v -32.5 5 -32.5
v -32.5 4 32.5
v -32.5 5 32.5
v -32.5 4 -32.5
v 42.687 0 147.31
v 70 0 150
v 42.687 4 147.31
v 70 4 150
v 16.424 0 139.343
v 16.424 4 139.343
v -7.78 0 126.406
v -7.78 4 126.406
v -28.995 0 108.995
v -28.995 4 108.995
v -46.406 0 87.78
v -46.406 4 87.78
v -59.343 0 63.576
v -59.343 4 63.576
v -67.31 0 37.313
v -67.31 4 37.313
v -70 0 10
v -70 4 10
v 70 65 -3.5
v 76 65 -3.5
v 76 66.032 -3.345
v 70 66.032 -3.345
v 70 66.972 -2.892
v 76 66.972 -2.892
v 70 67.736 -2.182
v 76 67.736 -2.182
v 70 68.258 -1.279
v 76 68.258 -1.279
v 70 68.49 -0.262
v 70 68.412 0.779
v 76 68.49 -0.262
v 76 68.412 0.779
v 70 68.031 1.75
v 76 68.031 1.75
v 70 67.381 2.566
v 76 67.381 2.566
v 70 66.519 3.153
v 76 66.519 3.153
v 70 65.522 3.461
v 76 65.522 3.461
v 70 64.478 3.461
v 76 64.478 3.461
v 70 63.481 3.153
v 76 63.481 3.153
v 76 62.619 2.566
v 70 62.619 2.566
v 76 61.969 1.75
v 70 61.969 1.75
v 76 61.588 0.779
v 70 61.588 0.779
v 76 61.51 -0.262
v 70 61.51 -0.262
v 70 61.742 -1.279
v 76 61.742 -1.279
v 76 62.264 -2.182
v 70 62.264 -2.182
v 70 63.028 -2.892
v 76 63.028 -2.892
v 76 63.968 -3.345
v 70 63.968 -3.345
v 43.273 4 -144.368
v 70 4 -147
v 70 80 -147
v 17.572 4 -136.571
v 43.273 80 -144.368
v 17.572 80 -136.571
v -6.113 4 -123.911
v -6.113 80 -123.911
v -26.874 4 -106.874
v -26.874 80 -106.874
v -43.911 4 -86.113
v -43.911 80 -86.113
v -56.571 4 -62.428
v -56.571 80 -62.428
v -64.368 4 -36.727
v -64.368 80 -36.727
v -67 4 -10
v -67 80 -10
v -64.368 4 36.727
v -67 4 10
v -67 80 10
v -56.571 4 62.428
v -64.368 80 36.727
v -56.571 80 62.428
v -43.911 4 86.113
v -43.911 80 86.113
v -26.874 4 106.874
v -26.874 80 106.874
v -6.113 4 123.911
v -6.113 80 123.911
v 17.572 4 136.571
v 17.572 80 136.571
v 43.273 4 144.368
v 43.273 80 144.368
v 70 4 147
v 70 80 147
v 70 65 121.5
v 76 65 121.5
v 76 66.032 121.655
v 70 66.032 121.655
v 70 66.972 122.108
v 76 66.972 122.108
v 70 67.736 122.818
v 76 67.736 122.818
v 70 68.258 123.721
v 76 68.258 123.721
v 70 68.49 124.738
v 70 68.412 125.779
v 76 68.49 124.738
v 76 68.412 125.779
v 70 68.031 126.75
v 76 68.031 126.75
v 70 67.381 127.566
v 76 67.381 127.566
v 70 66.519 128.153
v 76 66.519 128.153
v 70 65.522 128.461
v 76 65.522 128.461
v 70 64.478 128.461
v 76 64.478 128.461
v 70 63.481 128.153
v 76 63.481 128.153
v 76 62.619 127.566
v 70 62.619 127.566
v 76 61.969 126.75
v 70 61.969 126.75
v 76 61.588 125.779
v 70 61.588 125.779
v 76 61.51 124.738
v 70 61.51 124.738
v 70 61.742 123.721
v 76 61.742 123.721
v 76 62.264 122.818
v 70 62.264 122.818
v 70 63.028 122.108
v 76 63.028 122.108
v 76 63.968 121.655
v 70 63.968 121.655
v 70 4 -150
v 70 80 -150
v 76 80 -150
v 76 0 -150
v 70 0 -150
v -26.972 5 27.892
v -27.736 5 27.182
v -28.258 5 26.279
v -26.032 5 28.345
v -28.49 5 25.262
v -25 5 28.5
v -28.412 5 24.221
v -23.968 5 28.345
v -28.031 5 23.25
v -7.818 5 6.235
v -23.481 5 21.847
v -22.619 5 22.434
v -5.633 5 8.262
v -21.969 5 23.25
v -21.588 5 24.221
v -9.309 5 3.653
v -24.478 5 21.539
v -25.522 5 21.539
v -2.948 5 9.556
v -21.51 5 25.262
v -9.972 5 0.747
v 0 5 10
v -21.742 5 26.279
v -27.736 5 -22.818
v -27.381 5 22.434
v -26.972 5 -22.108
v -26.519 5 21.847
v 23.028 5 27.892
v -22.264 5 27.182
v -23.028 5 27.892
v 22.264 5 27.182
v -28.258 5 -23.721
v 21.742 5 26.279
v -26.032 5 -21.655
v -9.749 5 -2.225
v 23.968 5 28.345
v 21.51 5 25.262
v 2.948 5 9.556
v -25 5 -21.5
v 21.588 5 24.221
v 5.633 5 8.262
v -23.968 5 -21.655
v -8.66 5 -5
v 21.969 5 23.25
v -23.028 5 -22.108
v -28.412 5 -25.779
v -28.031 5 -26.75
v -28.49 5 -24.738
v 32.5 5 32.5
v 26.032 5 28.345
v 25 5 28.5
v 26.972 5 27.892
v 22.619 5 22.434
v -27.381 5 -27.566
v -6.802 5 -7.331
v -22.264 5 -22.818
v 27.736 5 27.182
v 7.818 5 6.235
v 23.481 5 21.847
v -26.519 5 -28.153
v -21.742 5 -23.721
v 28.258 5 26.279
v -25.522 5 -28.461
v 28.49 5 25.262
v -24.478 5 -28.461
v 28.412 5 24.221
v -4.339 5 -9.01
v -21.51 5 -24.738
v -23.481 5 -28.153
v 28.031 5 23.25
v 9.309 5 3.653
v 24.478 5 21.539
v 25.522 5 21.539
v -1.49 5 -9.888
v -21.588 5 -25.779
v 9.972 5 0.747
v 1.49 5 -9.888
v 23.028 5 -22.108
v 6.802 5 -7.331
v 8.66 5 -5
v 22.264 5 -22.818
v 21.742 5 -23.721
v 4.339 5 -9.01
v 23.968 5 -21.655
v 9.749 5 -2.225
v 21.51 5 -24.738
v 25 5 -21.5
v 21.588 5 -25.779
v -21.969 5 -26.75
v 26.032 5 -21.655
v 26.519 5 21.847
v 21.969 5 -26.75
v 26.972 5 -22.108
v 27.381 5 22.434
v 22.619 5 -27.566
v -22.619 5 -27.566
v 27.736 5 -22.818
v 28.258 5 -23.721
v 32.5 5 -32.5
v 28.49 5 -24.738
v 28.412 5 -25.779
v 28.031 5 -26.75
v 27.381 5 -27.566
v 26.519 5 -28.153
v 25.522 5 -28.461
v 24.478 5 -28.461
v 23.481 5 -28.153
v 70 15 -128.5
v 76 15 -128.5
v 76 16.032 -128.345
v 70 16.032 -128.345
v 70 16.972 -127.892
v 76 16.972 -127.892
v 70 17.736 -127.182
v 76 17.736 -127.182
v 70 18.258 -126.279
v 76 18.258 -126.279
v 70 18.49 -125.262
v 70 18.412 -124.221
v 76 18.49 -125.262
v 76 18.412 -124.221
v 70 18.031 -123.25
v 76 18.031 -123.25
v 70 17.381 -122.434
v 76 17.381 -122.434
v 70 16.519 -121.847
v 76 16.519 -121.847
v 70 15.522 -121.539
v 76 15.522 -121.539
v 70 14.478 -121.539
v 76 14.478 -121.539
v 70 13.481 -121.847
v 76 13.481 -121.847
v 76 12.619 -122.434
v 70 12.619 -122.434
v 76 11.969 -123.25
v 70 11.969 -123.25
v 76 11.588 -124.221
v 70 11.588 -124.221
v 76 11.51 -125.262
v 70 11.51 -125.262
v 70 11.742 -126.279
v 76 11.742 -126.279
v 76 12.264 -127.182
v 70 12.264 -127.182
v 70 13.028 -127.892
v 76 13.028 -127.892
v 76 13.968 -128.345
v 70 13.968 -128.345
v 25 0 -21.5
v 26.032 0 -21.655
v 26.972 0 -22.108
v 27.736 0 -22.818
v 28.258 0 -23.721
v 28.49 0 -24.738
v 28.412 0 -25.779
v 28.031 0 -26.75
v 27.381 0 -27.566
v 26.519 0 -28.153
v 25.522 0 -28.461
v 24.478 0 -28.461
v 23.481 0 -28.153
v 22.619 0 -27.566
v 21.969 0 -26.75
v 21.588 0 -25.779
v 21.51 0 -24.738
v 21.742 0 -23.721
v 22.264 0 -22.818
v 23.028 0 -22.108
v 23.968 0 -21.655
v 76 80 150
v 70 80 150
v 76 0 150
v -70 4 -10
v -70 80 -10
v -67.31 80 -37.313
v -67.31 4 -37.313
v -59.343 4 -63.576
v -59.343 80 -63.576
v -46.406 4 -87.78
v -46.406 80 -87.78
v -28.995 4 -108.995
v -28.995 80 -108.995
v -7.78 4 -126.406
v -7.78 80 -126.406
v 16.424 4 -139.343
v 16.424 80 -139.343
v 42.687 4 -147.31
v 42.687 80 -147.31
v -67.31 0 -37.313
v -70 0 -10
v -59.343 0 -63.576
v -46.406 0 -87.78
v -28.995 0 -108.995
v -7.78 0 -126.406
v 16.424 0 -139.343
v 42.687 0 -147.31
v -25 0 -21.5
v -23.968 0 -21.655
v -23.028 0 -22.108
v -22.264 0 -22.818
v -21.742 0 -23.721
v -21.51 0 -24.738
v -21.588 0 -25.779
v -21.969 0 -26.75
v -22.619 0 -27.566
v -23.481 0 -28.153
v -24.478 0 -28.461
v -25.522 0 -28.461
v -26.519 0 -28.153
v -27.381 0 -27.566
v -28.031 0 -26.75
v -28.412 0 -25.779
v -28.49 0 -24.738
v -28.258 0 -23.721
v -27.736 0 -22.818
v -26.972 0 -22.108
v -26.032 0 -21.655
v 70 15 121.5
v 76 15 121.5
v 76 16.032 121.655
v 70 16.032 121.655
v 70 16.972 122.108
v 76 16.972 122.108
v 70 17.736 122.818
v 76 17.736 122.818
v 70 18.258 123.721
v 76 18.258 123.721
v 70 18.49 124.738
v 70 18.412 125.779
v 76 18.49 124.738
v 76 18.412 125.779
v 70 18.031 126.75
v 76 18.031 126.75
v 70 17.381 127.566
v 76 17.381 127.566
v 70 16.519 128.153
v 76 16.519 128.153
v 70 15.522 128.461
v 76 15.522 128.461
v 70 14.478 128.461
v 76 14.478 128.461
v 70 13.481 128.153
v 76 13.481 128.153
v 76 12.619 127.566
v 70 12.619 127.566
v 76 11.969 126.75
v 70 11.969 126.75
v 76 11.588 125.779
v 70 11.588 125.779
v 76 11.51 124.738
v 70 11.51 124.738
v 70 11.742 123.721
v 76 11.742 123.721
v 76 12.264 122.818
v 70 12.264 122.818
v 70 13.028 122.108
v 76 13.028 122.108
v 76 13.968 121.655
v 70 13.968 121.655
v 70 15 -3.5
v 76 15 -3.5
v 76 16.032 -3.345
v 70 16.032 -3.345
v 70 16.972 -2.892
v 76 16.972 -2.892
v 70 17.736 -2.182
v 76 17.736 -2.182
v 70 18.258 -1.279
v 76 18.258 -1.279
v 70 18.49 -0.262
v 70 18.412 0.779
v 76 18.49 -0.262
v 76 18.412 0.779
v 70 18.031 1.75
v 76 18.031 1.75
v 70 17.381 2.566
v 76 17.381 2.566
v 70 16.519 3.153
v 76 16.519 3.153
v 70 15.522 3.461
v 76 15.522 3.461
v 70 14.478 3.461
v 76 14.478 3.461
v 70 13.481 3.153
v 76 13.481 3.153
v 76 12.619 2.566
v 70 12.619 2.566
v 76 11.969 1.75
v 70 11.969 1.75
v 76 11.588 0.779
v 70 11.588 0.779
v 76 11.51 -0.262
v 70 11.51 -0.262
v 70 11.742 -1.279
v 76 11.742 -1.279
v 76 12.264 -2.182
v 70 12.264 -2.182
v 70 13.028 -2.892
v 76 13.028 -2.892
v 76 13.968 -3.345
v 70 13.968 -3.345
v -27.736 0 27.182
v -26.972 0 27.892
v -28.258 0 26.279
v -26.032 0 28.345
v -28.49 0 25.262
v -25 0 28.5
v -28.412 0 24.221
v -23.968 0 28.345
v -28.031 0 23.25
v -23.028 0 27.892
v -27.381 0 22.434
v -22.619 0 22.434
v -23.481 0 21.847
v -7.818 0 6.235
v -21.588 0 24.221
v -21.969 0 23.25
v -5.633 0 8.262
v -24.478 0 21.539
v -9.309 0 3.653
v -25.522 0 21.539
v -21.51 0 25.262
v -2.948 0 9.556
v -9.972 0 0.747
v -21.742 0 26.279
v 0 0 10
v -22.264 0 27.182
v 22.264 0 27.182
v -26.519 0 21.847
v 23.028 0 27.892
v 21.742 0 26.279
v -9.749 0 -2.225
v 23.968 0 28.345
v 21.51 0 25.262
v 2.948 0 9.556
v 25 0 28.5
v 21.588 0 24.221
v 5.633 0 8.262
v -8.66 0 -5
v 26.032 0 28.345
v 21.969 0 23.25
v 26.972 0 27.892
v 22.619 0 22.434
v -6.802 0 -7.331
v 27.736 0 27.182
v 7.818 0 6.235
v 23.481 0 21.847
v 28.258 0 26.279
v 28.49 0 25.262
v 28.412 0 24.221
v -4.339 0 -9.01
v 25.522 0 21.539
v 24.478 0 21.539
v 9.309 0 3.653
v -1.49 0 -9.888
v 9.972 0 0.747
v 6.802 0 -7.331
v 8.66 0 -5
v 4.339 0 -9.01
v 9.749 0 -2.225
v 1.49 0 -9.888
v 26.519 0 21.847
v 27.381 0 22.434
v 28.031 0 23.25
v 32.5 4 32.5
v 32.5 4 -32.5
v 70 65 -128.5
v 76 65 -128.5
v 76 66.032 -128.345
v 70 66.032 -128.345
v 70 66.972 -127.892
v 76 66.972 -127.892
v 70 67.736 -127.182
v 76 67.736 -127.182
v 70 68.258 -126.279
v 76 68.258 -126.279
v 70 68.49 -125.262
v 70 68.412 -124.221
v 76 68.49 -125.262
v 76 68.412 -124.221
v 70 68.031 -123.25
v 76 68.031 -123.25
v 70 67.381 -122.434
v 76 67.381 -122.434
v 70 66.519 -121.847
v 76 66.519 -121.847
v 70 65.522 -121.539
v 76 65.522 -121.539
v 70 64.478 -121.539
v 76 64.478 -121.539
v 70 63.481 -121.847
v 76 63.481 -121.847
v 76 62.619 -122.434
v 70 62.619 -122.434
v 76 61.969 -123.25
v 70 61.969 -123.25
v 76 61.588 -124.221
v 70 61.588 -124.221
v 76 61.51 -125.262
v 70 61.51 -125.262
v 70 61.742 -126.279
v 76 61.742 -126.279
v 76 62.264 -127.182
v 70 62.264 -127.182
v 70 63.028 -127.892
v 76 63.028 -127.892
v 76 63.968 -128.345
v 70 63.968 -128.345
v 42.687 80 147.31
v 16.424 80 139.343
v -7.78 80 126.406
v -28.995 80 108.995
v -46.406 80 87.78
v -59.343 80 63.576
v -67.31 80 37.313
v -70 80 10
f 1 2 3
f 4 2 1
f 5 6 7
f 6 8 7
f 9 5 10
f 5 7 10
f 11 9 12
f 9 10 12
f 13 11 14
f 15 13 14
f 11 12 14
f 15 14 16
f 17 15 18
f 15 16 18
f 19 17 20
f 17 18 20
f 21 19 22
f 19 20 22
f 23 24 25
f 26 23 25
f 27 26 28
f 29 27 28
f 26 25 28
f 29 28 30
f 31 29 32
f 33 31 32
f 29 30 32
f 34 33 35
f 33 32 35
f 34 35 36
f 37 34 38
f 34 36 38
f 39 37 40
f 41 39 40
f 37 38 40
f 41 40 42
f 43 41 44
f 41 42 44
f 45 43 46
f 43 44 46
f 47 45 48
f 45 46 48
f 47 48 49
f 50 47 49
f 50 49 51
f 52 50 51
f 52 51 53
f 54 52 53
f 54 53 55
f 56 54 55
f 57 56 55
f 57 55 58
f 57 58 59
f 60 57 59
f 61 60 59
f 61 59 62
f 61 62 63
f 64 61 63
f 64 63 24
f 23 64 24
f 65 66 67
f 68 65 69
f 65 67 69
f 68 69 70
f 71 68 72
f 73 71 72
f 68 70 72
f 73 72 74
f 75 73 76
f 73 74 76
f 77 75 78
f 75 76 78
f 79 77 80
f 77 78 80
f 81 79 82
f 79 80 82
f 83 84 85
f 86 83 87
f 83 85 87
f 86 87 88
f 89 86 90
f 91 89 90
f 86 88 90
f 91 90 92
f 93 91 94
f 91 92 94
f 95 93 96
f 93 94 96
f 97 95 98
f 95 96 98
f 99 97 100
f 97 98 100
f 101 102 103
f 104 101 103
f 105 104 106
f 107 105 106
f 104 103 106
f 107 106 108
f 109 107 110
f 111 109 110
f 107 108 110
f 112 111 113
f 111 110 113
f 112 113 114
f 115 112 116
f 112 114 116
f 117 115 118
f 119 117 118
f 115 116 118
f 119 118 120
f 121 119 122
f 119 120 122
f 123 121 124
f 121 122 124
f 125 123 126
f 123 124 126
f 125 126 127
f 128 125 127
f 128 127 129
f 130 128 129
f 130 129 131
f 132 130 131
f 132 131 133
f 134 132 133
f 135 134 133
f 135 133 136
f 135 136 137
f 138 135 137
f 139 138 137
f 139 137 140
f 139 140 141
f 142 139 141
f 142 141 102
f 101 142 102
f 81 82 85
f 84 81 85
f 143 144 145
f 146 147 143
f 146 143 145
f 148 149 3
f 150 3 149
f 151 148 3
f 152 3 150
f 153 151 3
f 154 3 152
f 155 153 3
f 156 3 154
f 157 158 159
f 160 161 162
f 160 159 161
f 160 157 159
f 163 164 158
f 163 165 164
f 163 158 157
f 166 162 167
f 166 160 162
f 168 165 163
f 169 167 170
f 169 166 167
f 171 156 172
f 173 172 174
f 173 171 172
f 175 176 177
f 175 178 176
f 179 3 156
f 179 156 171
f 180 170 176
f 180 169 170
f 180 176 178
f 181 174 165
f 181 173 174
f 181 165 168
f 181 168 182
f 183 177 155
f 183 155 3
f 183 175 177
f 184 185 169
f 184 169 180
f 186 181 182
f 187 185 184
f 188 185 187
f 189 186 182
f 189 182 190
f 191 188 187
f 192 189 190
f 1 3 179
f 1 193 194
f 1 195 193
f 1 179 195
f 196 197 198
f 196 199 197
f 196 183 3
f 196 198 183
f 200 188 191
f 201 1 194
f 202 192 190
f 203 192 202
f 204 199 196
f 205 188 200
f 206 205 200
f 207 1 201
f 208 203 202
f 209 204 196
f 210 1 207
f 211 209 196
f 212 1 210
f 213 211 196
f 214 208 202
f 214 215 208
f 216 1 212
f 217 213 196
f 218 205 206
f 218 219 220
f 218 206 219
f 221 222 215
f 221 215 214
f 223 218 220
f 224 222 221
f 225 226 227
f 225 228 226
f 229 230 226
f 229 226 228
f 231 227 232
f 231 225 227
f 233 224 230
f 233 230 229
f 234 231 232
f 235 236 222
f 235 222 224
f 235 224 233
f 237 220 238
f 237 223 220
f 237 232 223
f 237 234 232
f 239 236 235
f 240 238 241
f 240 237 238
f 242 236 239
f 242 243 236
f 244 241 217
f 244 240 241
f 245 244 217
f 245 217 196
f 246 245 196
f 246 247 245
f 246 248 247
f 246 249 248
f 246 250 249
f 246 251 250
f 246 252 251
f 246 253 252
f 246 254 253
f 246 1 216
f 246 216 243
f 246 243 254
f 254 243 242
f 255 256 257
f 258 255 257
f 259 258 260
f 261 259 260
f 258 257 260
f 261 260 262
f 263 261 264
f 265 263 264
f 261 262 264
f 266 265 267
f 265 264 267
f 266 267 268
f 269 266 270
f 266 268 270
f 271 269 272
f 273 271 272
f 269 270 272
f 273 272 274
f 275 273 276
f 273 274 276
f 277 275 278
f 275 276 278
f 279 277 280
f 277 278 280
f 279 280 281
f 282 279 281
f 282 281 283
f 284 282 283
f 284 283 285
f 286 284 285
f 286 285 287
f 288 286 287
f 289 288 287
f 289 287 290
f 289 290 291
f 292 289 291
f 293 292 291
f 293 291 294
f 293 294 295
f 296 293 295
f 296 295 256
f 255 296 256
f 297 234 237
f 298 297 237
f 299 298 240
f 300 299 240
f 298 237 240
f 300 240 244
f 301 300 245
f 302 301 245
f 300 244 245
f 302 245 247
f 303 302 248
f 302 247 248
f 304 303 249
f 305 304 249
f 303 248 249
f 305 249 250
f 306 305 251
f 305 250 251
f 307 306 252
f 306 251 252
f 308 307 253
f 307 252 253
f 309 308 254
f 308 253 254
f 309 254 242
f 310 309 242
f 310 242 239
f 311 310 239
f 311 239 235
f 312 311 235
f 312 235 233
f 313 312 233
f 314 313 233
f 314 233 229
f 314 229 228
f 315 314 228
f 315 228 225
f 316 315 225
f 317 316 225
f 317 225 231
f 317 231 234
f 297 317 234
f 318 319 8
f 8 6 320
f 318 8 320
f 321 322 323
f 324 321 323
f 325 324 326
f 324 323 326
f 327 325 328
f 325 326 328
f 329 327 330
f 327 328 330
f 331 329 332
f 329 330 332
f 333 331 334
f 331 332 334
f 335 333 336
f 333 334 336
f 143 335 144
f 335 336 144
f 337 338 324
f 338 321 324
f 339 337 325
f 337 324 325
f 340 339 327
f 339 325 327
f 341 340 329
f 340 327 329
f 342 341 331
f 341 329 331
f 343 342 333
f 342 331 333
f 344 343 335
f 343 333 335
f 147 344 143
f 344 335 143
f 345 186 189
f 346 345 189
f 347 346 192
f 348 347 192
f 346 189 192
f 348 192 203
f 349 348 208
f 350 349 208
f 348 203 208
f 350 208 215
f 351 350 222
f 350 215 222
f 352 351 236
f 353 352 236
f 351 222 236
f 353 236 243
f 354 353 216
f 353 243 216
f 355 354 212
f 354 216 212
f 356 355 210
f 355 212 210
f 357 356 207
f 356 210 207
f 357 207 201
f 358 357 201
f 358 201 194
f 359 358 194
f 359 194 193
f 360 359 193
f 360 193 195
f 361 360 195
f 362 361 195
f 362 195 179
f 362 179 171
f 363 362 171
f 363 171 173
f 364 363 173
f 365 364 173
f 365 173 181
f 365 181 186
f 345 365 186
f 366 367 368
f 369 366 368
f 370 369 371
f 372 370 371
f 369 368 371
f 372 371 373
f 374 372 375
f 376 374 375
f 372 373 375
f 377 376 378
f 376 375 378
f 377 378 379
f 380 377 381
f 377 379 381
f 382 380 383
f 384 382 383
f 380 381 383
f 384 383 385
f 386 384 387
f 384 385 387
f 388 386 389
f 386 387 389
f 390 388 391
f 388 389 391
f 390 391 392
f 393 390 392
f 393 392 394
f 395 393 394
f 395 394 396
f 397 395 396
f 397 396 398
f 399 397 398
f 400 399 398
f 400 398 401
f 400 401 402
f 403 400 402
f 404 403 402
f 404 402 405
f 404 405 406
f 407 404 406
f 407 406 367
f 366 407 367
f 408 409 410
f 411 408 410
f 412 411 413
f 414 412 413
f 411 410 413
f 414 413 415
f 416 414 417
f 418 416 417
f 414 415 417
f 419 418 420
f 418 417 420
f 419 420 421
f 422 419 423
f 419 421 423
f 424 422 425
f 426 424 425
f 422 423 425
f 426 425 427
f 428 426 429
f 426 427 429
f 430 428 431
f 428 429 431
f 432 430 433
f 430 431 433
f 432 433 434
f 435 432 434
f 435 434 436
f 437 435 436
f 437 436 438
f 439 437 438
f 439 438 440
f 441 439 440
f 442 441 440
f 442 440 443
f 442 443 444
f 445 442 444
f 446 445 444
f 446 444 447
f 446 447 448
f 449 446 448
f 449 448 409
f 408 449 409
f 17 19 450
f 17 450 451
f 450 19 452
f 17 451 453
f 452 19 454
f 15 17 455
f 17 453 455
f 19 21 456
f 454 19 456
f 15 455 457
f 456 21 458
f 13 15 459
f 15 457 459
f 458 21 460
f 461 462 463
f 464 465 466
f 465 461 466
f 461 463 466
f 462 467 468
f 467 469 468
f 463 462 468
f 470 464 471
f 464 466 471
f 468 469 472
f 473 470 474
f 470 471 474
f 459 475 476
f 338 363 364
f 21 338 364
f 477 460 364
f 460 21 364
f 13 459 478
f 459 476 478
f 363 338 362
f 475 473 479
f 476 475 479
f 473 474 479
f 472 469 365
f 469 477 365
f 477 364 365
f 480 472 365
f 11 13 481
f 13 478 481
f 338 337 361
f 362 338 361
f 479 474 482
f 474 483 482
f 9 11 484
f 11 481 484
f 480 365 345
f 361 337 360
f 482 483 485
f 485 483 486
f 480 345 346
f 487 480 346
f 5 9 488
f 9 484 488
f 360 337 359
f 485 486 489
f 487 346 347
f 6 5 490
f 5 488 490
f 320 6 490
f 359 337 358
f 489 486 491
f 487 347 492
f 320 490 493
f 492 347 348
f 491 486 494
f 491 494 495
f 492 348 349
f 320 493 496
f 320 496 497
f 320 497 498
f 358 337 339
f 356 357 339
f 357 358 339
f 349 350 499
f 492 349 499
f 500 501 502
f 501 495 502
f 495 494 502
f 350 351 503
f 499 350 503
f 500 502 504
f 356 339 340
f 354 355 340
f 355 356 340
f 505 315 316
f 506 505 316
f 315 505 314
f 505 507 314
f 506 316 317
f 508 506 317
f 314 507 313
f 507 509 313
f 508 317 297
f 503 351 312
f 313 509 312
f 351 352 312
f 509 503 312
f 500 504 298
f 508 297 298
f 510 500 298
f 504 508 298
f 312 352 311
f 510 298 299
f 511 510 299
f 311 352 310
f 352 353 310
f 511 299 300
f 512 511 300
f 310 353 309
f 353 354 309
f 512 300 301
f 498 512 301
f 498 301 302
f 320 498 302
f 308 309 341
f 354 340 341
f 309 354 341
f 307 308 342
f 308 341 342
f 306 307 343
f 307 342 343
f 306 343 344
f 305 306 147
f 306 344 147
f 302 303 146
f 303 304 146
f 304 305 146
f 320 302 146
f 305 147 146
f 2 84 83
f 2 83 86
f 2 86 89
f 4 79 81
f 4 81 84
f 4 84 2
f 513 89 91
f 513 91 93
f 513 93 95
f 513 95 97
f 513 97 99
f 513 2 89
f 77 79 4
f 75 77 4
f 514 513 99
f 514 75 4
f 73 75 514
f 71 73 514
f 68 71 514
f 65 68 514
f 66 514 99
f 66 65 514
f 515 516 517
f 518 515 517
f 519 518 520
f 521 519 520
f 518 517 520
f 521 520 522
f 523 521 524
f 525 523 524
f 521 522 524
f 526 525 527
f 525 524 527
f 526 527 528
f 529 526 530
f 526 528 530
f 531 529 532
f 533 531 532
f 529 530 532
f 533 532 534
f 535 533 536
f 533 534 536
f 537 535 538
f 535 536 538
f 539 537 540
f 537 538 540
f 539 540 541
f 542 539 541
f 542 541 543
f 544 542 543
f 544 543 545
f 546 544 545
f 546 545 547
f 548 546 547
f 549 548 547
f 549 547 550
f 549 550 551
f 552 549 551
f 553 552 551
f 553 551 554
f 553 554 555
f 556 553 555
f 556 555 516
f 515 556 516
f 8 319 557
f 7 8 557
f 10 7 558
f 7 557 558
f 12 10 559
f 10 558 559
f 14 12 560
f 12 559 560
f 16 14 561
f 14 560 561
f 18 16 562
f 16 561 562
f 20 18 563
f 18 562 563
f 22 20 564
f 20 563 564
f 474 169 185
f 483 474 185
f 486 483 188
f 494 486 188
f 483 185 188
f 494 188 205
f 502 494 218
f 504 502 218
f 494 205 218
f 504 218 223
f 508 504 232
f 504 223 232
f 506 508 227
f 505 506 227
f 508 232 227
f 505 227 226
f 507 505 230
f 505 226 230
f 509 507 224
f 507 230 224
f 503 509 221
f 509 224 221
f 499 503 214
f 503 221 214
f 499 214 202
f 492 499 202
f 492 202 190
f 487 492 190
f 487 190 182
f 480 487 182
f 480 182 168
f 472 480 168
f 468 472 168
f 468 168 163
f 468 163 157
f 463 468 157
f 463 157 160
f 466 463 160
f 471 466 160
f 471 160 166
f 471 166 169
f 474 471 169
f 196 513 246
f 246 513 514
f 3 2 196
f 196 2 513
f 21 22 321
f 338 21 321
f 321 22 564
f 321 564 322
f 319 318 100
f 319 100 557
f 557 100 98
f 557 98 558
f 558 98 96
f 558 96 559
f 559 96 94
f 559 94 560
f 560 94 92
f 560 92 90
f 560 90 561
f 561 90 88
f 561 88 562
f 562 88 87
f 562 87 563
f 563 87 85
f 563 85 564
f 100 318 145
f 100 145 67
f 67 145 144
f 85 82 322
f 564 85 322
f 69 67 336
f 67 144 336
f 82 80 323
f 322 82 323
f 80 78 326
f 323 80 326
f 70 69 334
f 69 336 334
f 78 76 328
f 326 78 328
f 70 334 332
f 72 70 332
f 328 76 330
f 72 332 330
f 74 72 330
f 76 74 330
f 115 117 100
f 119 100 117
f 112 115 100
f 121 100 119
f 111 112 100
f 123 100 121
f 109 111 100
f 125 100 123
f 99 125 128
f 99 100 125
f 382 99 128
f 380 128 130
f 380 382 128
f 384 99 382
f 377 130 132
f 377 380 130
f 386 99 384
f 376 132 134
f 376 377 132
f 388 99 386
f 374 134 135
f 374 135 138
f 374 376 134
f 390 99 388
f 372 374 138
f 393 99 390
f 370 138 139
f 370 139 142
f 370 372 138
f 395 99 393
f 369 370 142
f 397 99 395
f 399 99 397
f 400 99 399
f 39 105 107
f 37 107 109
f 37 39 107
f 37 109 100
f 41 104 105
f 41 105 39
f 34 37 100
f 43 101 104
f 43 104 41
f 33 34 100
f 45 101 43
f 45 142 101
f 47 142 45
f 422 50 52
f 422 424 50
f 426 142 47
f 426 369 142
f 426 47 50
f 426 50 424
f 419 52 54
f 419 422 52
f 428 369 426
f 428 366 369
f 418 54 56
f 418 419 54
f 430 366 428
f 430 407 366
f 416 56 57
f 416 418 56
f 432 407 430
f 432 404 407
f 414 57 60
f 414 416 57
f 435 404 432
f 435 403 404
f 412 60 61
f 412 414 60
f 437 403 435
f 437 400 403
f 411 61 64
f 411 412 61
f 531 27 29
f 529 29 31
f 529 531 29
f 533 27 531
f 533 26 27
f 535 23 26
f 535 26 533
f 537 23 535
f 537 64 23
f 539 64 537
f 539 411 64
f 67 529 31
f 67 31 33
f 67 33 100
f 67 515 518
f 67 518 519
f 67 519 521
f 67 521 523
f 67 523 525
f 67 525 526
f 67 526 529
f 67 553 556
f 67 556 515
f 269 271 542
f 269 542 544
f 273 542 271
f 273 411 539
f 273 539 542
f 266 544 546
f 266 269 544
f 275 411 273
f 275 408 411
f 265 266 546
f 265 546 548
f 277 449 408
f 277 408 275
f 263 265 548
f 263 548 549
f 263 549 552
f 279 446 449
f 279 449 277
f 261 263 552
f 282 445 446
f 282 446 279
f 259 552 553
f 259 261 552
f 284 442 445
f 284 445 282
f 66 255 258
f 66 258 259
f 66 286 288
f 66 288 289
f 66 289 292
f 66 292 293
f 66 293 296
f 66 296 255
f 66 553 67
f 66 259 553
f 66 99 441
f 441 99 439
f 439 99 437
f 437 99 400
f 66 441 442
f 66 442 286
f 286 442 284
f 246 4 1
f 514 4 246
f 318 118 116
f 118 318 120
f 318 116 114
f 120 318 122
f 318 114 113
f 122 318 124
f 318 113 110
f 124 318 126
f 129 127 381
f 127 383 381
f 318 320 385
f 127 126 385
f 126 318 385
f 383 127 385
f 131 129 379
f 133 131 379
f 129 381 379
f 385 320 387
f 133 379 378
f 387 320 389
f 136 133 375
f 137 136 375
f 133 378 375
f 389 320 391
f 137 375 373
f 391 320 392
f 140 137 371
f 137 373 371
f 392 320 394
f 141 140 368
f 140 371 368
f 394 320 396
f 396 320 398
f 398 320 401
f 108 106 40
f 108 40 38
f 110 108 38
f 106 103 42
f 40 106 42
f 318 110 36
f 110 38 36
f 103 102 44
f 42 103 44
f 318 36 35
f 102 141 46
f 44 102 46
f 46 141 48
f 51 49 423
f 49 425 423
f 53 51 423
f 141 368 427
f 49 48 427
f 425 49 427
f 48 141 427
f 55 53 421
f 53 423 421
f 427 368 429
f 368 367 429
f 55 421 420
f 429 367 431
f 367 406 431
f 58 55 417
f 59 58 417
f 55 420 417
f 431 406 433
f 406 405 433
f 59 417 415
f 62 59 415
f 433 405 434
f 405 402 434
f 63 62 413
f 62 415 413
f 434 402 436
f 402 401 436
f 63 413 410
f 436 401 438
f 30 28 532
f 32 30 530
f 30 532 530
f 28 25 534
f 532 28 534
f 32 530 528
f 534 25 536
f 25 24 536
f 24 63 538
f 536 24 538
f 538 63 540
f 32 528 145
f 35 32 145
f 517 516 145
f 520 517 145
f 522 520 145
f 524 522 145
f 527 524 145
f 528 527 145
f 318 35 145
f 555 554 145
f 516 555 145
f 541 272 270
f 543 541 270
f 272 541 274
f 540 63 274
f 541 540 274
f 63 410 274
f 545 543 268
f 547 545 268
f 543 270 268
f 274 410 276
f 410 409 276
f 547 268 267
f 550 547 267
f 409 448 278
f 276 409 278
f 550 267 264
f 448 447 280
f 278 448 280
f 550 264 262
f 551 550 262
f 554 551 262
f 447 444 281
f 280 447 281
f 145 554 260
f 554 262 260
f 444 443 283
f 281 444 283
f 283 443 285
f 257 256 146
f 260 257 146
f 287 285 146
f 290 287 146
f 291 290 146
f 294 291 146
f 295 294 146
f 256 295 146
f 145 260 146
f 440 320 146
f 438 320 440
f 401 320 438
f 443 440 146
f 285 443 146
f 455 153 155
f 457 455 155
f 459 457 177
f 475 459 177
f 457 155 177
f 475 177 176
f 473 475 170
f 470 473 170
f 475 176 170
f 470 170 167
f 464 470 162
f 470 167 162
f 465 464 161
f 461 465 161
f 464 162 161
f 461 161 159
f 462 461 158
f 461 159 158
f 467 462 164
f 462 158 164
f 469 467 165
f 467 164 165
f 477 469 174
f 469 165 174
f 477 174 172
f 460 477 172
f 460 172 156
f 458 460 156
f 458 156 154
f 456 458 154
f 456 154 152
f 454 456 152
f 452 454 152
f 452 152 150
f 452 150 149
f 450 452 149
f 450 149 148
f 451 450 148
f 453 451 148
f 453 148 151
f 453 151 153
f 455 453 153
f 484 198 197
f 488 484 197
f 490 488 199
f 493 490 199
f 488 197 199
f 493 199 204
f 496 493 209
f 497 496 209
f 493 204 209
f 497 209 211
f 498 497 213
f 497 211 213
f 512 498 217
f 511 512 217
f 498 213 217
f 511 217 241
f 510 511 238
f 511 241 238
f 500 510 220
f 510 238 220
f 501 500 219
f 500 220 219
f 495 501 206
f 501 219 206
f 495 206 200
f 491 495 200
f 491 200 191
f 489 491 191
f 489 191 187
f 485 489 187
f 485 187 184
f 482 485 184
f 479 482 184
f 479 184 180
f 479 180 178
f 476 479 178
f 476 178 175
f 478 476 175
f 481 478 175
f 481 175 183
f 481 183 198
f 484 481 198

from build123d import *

# Parameters (mm, degrees)
SKETCH_1_W          = 140
SKETCH_1_H          = 300
EXTRUDE_1_DEPTH     = 4
SKETCH_2_W          = 6
SKETCH_2_H          = 300
EXTRUDE_2_DEPTH     = 80
FILLET_1_R          = 140
SKETCH_3_W          = 65
SKETCH_3_H          = 65
EXTRUDE_3_DEPTH     = 1
SKETCH_4_R          = 3.5
SKETCH_4_R_2        = 10
CUT_EXTRUDE_1_DEPTH = 185.122242002
EXTRUDE_START       = 76
EXTRUDE_1_2_DEPTH   = 76
SKETCH_16_R         = 3.5
CUT_EXTRUDE_6_DEPTH = 20


with BuildPart() as part:
    # Эскиз1 → Extrude 1 (new body)
    with BuildSketch(Plane(origin=(0, 0, 0), x_dir=(1, 0, 0), z_dir=(0, 1, 0))):
        Rectangle(SKETCH_1_W, SKETCH_1_H)
    extrude(amount=EXTRUDE_1_DEPTH)

    # Эскиз2 → Бобышка-Вытянуть2 (add)
    with BuildSketch(Plane(origin=(0, 0, 0), x_dir=(1, 0, 0), z_dir=(0, 1, 0))):
        with Locations((73, 0)):
            Rectangle(SKETCH_2_W, SKETCH_2_H)
    extrude(amount=EXTRUDE_2_DEPTH)

    # Скругление1
    fillet_1_edges = [part.edges().sort_by_distance(p)[0] for p in [
        (-70, 2, -150),
        (-70, 2, 150),
    ]]
    fillet(fillet_1_edges, radius=FILLET_1_R)

    # Эскиз3 → Бобышка-Вытянуть3 (add)
    with BuildSketch(Plane(origin=(0, 4, 0), x_dir=(1, 0, 0), z_dir=(0, 1, 0))):
        Rectangle(SKETCH_3_W, SKETCH_3_H)
    extrude(amount=EXTRUDE_3_DEPTH)

    # Эскиз4 → Вырез-Вытянуть1 (cut, through all)
    with BuildSketch(Plane(origin=(0, 5, 0), x_dir=(1, 0, 0), z_dir=(0, 1, 0))):
        with Locations(Location((-25, 25, 0), (0, 0, 270))):
            Circle(SKETCH_4_R)
        with Locations(Location((25, 25, 0), (0, 0, 270))):
            Circle(SKETCH_4_R)
        with Locations(Location((-25, -25, 0), (0, 0, 270))):
            Circle(SKETCH_4_R)
        with Locations(Location((25, -25, 0), (0, 0, 270))):
            Circle(SKETCH_4_R)
        with Locations(Location((0, 0, 0), (0, 0, 270))):
            Circle(SKETCH_4_R_2)
    extrude(amount=-CUT_EXTRUDE_1_DEPTH, mode=Mode.SUBTRACT)

    # Эскиз9 → Extrude 1 2 (add)
    with BuildSketch(Plane(origin=(0, 4, 0), x_dir=(1, 0, 0), z_dir=(0, 1, 0)).offset(EXTRUDE_START)):
        with BuildLine():
            ThreePointArc((70, 147), (-26.873629023, 106.873629023), (-67, 10))
            Line((-67, 10), (-67, -10))
            ThreePointArc((-67, -10), (-26.873629023, -106.873629023), (70, -147))
            Line((70, -147), (70, -150))
            ThreePointArc((70, -150), (-28.994949366, -108.994949366), (-70, -10))
            Line((-70, -10), (-70, 10))
            ThreePointArc((-70, 10), (-28.994949366, 108.994949366), (70, 150))
            Line((70, 150), (70, 147))
        make_face()
    extrude(amount=-EXTRUDE_1_2_DEPTH)

    # Эскиз16 → Вырез-Вытянуть6 (cut)
    with BuildSketch(Plane(origin=(76, 0, 0), x_dir=(0, 0, -1), z_dir=(1, 0, 0))):
        with Locations((0, 65)):
            Circle(SKETCH_16_R)
        with Locations((0, 15)):
            Circle(SKETCH_16_R)
        with Locations((125, 65)):
            Circle(SKETCH_16_R)
        with Locations((-125, 65)):
            Circle(SKETCH_16_R)
        with Locations((-125, 15)):
            Circle(SKETCH_16_R)
        with Locations((125, 15)):
            Circle(SKETCH_16_R)
    extrude(amount=-CUT_EXTRUDE_6_DEPTH, mode=Mode.SUBTRACT)


solid = part.part
